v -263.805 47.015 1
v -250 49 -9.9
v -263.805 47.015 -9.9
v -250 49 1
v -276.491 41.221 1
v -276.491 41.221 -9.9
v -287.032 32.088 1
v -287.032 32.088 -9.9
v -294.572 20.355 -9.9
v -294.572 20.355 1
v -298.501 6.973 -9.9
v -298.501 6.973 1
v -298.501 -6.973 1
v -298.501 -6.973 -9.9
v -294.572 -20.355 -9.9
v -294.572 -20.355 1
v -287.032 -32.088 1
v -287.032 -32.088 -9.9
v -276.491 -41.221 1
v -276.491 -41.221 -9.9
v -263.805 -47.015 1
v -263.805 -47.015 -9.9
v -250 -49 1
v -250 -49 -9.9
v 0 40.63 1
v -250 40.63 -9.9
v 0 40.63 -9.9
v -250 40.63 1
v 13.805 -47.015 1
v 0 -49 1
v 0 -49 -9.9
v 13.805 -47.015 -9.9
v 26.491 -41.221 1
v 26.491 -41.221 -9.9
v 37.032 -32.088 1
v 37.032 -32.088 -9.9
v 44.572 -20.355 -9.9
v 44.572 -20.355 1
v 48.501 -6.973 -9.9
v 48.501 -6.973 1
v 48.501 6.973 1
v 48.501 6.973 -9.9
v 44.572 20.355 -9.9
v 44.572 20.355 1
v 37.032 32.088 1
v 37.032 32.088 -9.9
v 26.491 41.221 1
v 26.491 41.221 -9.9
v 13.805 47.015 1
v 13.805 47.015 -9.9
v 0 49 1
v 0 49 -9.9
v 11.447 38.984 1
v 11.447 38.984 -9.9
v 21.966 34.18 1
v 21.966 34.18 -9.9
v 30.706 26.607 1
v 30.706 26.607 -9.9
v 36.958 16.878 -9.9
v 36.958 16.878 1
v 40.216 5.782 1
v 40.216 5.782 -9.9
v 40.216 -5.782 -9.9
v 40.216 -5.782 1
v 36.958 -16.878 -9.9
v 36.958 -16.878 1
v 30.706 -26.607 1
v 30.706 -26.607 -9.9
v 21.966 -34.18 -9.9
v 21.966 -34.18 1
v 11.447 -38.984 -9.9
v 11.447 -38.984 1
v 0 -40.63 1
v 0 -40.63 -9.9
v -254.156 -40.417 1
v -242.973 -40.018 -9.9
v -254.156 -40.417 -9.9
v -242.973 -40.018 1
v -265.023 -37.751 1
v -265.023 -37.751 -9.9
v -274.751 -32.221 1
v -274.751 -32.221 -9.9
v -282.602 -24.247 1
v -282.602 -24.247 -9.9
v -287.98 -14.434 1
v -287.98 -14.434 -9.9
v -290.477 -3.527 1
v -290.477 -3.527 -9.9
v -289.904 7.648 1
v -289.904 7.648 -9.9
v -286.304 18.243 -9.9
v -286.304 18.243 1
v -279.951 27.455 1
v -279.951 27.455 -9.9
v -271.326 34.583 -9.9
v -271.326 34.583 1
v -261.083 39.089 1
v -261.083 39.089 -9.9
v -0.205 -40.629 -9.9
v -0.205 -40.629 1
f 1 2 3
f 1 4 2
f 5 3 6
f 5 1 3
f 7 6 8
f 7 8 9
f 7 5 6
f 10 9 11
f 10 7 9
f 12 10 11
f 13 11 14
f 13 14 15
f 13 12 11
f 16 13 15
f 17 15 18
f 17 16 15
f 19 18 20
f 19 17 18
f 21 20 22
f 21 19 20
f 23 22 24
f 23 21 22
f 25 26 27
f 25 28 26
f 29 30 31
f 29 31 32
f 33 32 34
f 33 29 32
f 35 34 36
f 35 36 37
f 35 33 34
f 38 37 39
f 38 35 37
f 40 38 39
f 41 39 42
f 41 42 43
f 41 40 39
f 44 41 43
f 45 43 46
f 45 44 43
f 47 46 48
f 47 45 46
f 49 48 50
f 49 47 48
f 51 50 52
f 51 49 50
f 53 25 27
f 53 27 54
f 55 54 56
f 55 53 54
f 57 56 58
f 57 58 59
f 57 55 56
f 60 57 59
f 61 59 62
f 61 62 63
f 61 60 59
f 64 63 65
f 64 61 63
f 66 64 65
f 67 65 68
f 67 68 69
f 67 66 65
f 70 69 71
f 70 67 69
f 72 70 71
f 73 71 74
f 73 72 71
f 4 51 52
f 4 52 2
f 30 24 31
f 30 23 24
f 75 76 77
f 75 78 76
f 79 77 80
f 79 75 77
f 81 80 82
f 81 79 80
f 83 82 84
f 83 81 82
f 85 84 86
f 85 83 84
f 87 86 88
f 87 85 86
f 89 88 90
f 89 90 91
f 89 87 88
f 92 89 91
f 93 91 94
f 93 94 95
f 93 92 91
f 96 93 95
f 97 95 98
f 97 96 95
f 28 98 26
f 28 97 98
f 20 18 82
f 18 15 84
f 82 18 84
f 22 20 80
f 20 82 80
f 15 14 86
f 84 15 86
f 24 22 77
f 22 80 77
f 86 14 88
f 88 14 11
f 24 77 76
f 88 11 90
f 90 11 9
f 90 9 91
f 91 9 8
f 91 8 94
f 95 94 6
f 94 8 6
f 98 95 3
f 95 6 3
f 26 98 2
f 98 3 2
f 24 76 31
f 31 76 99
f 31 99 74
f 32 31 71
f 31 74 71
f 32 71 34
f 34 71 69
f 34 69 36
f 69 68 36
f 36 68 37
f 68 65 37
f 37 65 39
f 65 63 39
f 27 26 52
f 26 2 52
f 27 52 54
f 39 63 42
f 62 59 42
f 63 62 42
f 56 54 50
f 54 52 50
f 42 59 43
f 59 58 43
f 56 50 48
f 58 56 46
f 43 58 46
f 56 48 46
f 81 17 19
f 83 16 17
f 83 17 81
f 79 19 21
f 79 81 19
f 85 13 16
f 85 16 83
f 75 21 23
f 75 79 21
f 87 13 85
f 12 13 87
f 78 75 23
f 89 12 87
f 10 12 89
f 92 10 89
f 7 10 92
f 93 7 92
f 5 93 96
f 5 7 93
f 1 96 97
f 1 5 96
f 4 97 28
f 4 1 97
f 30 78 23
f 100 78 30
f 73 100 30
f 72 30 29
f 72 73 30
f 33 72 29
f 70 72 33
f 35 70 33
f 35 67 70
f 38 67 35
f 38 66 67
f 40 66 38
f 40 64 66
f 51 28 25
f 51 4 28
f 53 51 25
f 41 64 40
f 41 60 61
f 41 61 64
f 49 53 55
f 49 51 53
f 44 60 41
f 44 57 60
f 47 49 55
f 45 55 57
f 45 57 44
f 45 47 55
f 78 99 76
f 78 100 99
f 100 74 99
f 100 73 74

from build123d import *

# Parameters (mm, degrees)
DODANIE_WYCI_GNI_CIE1_DEPTH      = 1
DODANIE_WYCI_GNI_CIE1_DEPTH_BACK = 9.9


with BuildPart() as part:
    # Szkic1 → Dodanie-wyciągnięcie1 (new body, two sides)
    with BuildSketch(Plane.XY) as dodanie_wyci_gni_cie1_sk:
        with BuildLine():
            Line((-250, -49), (0, -49))
            ThreePointArc((0, -49), (49, 0), (0, 49))
            Line((0, 49), (-250, 49))
            ThreePointArc((-250, 49), (-299, 0), (-250, -49))
        make_face()
        with BuildLine():
            ThreePointArc((0, 40.63), (40.63, 0), (0, -40.63))
            Line((0, -40.63), (-0.2047739, -40.62948397))
            Line((-0.2047739, -40.62948397), (-242.972914826, -40.017708255))
            ThreePointArc((-242.972914826, -40.017708255), (-290.476637622, -3.526855087), (-250, 40.63))
            Line((-250, 40.63), (0, 40.63))
        make_face(mode=Mode.SUBTRACT)
    extrude(amount=DODANIE_WYCI_GNI_CIE1_DEPTH)
    extrude(dodanie_wyci_gni_cie1_sk.sketch, amount=-DODANIE_WYCI_GNI_CIE1_DEPTH_BACK)


solid = part.part
